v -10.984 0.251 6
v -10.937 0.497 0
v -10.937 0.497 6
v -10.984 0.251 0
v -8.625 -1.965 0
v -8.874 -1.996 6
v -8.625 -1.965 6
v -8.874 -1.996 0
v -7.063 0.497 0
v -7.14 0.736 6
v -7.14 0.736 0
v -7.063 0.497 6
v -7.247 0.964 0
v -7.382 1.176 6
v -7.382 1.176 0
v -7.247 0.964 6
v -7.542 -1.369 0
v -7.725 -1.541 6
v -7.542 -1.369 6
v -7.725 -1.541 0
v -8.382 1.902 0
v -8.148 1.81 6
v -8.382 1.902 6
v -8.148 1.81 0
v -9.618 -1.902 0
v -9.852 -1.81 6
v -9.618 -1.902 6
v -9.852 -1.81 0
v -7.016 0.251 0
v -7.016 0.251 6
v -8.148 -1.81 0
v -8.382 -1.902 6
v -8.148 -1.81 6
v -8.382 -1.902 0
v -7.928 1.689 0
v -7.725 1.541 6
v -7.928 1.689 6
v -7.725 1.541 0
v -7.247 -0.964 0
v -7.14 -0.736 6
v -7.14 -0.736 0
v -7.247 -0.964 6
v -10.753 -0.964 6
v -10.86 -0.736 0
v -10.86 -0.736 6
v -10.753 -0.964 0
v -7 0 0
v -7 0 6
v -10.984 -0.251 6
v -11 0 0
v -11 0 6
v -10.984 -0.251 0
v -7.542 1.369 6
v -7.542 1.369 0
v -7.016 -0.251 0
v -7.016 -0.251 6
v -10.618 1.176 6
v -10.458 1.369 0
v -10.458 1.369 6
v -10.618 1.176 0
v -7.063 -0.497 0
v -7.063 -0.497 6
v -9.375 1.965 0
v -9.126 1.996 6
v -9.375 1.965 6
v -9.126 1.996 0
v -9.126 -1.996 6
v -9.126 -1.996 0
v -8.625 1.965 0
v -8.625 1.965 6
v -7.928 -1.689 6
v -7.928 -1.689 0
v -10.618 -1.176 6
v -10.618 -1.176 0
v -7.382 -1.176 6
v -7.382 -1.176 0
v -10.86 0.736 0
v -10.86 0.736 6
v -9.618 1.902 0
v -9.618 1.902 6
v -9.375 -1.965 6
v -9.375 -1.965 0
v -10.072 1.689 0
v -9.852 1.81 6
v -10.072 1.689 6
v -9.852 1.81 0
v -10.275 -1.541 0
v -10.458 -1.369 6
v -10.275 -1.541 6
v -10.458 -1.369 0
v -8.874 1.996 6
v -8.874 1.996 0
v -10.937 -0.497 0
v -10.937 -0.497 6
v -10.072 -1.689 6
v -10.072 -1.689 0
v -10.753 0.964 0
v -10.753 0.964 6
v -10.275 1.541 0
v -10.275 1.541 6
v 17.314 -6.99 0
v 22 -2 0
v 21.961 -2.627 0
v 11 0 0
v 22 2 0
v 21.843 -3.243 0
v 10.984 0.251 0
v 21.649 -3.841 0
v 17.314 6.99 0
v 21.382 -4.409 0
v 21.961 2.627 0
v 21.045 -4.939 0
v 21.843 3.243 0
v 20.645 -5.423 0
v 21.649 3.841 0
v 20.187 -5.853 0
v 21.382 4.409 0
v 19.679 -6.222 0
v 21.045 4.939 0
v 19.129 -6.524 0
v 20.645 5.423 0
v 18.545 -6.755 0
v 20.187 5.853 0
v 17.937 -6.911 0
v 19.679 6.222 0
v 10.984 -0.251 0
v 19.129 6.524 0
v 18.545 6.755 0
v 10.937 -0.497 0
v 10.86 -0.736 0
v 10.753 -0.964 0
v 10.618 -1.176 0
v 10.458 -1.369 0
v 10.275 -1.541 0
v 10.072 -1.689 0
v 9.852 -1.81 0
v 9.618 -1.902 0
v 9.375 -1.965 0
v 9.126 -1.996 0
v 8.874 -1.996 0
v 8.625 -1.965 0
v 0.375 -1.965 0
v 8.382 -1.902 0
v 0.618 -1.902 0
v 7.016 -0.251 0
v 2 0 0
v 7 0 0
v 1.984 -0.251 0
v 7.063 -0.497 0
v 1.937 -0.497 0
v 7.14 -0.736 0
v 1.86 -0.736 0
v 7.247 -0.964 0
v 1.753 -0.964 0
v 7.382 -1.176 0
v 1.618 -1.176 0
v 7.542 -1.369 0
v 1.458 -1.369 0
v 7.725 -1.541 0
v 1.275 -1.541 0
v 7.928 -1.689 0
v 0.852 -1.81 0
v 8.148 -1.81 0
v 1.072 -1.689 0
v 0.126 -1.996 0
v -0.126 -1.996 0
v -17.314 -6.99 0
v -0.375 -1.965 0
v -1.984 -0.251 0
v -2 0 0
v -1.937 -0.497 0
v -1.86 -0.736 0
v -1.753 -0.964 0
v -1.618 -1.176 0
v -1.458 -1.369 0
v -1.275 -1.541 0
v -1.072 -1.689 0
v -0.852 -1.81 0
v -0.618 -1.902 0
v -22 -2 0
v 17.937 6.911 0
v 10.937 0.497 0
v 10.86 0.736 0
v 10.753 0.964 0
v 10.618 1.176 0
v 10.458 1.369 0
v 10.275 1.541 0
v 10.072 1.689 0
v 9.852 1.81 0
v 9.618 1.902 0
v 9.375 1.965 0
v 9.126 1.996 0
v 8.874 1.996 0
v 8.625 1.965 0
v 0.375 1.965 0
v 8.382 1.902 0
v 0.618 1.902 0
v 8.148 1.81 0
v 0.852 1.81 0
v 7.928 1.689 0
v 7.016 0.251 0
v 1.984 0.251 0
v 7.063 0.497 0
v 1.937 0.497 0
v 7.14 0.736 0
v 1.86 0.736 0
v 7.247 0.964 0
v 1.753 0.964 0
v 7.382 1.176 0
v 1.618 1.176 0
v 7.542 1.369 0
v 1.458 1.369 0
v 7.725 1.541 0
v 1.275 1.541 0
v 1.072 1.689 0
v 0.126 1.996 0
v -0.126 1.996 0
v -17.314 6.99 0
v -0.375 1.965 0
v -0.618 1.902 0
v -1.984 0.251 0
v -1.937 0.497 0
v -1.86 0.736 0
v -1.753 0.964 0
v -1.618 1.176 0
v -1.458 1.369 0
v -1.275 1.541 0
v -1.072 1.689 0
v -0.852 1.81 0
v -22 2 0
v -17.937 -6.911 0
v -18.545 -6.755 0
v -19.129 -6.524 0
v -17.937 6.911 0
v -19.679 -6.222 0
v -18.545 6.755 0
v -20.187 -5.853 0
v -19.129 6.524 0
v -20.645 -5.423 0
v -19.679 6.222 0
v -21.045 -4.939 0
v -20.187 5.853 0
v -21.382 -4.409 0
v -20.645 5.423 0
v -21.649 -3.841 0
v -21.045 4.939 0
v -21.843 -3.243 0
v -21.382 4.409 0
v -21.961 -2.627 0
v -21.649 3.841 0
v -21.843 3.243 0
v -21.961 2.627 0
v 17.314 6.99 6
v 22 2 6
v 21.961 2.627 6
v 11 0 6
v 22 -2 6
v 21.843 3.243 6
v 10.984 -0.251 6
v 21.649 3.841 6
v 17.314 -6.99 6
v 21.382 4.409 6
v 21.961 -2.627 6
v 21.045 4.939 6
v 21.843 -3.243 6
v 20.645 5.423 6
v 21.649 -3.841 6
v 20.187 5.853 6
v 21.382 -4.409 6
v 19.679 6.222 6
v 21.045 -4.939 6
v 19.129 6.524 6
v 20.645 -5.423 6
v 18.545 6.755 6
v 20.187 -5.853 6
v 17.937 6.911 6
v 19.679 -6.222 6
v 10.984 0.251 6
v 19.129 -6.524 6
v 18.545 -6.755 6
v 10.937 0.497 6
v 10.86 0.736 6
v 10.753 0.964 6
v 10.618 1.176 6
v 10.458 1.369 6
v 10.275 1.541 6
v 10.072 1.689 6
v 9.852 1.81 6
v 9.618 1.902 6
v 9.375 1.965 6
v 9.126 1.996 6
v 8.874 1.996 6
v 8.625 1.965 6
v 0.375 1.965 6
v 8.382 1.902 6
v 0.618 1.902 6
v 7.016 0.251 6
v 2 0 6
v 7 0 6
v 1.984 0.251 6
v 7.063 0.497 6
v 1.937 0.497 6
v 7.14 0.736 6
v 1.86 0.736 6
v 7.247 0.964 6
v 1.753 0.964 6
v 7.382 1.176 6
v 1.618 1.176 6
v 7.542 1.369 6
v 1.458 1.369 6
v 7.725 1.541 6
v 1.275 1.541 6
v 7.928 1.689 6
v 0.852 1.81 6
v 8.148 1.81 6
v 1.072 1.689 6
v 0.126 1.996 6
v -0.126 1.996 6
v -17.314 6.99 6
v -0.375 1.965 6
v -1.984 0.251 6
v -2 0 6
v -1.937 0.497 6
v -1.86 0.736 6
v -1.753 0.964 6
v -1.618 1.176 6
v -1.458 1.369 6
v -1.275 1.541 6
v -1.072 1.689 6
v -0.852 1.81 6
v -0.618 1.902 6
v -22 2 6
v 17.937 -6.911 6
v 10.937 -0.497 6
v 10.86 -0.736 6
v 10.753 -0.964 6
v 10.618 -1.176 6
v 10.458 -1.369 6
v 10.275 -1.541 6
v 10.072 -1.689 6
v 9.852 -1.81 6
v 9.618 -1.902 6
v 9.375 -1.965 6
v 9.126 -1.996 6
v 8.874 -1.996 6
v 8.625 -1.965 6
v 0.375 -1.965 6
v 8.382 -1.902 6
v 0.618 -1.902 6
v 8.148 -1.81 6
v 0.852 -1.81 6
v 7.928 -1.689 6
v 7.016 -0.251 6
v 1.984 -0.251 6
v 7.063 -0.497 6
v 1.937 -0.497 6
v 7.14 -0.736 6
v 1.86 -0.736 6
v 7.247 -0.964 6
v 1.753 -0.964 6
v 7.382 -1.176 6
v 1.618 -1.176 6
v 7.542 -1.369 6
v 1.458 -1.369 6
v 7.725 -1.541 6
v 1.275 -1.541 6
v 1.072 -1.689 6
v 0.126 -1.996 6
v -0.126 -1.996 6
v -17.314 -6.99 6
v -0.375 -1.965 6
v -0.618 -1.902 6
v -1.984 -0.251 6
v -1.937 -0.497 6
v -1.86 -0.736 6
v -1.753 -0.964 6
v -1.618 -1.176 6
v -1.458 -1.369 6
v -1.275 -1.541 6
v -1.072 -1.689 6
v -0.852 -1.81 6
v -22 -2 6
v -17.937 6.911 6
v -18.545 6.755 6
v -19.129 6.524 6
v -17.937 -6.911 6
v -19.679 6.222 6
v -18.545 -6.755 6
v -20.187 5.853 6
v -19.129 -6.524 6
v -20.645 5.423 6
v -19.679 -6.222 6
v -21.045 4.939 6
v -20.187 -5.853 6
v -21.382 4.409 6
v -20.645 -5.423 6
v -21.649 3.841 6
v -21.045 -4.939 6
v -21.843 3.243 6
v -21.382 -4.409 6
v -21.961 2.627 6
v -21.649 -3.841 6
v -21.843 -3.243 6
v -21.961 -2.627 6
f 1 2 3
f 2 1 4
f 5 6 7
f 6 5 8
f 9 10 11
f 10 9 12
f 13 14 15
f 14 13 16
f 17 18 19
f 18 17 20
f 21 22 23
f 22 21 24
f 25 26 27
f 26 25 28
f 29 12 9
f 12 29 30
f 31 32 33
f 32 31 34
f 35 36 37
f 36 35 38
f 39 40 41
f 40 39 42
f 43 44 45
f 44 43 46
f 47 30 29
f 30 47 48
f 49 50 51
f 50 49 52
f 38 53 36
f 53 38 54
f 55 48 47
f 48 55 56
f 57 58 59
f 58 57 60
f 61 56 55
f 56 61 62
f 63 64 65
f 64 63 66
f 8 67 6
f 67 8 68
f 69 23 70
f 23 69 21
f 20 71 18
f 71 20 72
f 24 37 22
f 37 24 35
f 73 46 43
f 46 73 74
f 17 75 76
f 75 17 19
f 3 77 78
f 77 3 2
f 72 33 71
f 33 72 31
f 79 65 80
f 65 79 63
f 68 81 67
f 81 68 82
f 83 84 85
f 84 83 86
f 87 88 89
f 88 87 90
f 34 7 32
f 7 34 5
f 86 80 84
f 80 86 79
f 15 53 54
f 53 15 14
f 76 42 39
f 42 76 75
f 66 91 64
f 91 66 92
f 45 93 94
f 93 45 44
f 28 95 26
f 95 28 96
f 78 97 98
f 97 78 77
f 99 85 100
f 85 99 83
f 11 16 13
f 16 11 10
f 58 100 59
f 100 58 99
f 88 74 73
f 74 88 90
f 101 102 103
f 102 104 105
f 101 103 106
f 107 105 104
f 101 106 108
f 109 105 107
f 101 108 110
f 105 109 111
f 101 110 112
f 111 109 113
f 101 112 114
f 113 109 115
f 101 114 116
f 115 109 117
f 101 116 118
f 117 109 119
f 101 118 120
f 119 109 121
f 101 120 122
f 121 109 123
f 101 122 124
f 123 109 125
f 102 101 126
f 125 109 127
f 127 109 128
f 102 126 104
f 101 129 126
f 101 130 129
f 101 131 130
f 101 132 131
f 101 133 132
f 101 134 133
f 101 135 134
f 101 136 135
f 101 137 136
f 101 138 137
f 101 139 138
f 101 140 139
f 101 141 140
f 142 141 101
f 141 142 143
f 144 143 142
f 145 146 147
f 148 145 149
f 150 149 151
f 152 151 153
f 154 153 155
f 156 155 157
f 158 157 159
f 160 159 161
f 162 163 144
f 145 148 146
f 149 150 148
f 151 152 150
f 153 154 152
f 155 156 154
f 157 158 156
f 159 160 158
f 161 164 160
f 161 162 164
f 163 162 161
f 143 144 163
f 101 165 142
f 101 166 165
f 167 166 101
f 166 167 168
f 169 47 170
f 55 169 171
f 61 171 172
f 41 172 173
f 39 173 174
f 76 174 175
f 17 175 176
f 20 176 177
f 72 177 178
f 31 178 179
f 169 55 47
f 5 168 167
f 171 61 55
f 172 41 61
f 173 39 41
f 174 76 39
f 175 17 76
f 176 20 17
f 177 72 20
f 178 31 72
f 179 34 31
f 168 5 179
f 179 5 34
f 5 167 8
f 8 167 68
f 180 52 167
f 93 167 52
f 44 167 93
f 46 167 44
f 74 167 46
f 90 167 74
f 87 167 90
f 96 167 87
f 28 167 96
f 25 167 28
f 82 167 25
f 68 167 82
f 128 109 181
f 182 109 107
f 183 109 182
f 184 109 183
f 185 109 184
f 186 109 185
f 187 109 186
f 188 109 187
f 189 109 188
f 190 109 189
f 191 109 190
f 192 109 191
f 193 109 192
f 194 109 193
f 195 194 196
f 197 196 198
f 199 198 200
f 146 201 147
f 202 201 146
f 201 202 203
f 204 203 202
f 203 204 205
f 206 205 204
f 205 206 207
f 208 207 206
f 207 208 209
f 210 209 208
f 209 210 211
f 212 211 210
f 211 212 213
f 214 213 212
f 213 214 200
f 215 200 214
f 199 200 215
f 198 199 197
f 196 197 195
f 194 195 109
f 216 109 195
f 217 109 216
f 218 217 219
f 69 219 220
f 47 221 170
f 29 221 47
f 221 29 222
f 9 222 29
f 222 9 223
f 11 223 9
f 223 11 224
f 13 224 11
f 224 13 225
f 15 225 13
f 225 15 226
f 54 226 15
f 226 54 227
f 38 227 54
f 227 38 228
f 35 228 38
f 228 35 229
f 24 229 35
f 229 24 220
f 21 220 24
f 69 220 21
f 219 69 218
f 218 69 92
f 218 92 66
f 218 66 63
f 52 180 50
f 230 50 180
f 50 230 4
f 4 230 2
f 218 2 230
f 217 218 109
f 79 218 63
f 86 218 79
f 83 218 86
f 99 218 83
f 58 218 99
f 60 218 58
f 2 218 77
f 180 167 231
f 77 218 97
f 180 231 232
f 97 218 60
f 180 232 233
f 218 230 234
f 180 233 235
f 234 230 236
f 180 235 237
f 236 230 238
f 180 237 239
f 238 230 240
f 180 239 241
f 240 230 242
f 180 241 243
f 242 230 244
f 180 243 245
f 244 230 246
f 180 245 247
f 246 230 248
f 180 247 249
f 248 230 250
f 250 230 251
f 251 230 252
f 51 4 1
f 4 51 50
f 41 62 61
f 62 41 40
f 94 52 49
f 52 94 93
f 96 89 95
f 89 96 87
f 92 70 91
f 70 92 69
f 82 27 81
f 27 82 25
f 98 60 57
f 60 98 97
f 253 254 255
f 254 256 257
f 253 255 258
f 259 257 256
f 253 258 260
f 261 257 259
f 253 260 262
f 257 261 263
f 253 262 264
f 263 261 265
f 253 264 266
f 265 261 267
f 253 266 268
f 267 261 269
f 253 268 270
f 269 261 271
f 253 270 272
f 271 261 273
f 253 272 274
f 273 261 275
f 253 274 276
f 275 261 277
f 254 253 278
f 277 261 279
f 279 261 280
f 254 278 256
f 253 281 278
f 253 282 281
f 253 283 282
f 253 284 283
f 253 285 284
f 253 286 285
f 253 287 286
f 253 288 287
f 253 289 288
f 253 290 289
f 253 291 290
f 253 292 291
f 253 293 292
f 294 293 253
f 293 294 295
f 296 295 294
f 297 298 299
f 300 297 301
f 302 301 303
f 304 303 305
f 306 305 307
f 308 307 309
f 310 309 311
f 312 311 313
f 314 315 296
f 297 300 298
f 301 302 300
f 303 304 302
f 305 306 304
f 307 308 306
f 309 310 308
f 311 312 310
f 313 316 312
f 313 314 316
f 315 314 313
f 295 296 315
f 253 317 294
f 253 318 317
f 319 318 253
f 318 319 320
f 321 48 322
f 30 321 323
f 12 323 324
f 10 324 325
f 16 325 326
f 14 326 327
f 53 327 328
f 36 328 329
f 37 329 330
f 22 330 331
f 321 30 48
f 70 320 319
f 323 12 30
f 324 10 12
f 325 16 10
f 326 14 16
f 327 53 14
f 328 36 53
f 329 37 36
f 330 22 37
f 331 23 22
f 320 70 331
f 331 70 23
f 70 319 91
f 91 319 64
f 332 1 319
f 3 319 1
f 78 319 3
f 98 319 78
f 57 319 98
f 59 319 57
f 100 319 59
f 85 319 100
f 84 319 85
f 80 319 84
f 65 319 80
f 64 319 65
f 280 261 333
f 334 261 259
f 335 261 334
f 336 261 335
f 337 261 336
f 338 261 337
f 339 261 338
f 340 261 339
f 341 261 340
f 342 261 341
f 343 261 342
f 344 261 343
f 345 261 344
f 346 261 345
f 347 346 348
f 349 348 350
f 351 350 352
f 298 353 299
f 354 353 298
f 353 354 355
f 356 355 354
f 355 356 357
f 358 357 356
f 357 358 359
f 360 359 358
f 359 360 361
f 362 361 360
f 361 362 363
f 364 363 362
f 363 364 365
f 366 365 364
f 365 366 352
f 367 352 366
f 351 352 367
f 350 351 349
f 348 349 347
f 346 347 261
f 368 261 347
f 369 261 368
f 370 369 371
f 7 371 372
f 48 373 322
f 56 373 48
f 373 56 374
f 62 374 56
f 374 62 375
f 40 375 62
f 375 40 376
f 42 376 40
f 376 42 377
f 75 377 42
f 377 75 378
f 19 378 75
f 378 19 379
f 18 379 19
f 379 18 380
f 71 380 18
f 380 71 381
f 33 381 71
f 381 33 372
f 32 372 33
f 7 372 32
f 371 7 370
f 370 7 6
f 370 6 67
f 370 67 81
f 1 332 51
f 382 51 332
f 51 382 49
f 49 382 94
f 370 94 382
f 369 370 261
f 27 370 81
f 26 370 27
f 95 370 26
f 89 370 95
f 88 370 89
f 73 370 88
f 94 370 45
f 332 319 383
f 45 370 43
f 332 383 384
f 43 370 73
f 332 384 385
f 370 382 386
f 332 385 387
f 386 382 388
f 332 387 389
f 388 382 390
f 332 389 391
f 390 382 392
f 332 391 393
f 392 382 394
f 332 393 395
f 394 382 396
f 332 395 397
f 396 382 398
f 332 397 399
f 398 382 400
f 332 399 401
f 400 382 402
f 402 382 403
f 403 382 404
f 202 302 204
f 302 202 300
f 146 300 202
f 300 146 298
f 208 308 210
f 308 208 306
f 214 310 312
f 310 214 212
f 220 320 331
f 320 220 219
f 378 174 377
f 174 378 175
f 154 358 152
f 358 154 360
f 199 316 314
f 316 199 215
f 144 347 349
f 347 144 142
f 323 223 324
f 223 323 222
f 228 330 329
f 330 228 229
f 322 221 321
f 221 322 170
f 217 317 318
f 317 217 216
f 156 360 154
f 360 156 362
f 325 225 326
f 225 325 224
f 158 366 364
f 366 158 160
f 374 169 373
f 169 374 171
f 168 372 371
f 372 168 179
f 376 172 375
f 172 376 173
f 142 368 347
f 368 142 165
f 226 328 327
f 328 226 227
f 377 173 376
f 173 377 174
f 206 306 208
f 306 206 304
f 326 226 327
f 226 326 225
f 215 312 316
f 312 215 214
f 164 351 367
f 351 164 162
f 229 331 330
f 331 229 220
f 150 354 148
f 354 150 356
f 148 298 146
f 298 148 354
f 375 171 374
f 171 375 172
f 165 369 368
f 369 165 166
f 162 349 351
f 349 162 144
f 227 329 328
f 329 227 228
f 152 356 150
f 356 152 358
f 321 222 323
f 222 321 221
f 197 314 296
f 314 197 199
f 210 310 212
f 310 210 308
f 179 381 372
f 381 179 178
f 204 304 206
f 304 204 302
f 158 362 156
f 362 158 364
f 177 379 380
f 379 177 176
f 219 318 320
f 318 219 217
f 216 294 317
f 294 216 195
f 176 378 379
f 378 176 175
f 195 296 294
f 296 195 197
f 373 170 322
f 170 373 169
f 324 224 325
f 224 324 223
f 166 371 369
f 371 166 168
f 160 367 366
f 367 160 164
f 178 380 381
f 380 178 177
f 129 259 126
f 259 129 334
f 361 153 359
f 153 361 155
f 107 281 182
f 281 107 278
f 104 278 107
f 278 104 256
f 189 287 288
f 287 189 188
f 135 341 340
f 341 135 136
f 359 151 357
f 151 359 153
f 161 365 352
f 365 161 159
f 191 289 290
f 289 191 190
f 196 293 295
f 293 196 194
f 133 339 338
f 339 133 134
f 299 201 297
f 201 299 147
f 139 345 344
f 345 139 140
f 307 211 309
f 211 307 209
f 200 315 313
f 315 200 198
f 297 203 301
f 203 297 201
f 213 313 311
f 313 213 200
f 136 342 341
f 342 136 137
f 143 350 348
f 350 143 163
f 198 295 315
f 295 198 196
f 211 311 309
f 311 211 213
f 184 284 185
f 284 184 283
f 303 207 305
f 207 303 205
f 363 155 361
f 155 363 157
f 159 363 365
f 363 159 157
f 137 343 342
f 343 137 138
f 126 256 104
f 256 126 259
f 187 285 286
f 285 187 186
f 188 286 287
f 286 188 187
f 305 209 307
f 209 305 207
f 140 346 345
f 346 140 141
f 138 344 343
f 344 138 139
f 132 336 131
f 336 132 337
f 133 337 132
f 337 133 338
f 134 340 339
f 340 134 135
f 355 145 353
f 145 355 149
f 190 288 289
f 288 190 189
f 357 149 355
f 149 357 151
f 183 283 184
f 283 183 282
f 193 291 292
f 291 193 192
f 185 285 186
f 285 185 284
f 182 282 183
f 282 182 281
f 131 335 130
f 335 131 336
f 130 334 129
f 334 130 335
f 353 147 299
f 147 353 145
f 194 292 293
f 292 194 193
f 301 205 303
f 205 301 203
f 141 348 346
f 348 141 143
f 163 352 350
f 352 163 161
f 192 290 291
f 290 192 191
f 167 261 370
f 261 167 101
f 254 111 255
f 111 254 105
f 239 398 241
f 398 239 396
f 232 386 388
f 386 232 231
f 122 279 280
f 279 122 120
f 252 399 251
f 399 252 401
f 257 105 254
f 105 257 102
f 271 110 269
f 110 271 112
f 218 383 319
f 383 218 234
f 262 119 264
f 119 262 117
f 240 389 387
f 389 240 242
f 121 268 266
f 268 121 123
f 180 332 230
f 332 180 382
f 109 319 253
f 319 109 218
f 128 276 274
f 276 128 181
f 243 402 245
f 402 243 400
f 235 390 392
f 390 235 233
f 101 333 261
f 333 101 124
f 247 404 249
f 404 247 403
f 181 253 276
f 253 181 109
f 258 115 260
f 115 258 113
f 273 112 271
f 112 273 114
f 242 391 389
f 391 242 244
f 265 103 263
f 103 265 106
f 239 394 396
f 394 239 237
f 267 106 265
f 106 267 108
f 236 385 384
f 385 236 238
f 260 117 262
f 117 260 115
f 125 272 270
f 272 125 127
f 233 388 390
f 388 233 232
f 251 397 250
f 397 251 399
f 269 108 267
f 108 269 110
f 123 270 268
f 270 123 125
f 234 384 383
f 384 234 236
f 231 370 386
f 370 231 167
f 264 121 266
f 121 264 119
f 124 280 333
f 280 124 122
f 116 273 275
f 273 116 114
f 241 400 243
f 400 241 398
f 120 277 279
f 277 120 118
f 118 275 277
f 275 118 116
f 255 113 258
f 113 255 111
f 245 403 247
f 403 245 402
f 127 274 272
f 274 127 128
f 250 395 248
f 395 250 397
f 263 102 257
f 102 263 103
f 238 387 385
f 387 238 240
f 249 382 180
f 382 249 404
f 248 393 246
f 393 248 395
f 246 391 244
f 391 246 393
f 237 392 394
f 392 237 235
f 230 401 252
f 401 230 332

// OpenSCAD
$fn = 50;

difference() {
	union() {
		hull() {
			translate(v = [-17.0, 2.0, 0]) {
				cylinder(h = 6, r = 5);
			}
			translate(v = [17.0, 2.0, 0]) {
				cylinder(h = 6, r = 5);
			}
			translate(v = [-17.0, -2.0, 0]) {
				cylinder(h = 6, r = 5);
			}
			translate(v = [17.0, -2.0, 0]) {
				cylinder(h = 6, r = 5);
			}
		}
	}
	union() {
		translate(v = [-9.0, 0, 0.0]) {
			cylinder(h = 6, r = 2.0);
		}
		cylinder(h = 6, r = 2.0);
		translate(v = [9.0, 0, 0.0]) {
			cylinder(h = 6, r = 2.0);
		}
	}
}
